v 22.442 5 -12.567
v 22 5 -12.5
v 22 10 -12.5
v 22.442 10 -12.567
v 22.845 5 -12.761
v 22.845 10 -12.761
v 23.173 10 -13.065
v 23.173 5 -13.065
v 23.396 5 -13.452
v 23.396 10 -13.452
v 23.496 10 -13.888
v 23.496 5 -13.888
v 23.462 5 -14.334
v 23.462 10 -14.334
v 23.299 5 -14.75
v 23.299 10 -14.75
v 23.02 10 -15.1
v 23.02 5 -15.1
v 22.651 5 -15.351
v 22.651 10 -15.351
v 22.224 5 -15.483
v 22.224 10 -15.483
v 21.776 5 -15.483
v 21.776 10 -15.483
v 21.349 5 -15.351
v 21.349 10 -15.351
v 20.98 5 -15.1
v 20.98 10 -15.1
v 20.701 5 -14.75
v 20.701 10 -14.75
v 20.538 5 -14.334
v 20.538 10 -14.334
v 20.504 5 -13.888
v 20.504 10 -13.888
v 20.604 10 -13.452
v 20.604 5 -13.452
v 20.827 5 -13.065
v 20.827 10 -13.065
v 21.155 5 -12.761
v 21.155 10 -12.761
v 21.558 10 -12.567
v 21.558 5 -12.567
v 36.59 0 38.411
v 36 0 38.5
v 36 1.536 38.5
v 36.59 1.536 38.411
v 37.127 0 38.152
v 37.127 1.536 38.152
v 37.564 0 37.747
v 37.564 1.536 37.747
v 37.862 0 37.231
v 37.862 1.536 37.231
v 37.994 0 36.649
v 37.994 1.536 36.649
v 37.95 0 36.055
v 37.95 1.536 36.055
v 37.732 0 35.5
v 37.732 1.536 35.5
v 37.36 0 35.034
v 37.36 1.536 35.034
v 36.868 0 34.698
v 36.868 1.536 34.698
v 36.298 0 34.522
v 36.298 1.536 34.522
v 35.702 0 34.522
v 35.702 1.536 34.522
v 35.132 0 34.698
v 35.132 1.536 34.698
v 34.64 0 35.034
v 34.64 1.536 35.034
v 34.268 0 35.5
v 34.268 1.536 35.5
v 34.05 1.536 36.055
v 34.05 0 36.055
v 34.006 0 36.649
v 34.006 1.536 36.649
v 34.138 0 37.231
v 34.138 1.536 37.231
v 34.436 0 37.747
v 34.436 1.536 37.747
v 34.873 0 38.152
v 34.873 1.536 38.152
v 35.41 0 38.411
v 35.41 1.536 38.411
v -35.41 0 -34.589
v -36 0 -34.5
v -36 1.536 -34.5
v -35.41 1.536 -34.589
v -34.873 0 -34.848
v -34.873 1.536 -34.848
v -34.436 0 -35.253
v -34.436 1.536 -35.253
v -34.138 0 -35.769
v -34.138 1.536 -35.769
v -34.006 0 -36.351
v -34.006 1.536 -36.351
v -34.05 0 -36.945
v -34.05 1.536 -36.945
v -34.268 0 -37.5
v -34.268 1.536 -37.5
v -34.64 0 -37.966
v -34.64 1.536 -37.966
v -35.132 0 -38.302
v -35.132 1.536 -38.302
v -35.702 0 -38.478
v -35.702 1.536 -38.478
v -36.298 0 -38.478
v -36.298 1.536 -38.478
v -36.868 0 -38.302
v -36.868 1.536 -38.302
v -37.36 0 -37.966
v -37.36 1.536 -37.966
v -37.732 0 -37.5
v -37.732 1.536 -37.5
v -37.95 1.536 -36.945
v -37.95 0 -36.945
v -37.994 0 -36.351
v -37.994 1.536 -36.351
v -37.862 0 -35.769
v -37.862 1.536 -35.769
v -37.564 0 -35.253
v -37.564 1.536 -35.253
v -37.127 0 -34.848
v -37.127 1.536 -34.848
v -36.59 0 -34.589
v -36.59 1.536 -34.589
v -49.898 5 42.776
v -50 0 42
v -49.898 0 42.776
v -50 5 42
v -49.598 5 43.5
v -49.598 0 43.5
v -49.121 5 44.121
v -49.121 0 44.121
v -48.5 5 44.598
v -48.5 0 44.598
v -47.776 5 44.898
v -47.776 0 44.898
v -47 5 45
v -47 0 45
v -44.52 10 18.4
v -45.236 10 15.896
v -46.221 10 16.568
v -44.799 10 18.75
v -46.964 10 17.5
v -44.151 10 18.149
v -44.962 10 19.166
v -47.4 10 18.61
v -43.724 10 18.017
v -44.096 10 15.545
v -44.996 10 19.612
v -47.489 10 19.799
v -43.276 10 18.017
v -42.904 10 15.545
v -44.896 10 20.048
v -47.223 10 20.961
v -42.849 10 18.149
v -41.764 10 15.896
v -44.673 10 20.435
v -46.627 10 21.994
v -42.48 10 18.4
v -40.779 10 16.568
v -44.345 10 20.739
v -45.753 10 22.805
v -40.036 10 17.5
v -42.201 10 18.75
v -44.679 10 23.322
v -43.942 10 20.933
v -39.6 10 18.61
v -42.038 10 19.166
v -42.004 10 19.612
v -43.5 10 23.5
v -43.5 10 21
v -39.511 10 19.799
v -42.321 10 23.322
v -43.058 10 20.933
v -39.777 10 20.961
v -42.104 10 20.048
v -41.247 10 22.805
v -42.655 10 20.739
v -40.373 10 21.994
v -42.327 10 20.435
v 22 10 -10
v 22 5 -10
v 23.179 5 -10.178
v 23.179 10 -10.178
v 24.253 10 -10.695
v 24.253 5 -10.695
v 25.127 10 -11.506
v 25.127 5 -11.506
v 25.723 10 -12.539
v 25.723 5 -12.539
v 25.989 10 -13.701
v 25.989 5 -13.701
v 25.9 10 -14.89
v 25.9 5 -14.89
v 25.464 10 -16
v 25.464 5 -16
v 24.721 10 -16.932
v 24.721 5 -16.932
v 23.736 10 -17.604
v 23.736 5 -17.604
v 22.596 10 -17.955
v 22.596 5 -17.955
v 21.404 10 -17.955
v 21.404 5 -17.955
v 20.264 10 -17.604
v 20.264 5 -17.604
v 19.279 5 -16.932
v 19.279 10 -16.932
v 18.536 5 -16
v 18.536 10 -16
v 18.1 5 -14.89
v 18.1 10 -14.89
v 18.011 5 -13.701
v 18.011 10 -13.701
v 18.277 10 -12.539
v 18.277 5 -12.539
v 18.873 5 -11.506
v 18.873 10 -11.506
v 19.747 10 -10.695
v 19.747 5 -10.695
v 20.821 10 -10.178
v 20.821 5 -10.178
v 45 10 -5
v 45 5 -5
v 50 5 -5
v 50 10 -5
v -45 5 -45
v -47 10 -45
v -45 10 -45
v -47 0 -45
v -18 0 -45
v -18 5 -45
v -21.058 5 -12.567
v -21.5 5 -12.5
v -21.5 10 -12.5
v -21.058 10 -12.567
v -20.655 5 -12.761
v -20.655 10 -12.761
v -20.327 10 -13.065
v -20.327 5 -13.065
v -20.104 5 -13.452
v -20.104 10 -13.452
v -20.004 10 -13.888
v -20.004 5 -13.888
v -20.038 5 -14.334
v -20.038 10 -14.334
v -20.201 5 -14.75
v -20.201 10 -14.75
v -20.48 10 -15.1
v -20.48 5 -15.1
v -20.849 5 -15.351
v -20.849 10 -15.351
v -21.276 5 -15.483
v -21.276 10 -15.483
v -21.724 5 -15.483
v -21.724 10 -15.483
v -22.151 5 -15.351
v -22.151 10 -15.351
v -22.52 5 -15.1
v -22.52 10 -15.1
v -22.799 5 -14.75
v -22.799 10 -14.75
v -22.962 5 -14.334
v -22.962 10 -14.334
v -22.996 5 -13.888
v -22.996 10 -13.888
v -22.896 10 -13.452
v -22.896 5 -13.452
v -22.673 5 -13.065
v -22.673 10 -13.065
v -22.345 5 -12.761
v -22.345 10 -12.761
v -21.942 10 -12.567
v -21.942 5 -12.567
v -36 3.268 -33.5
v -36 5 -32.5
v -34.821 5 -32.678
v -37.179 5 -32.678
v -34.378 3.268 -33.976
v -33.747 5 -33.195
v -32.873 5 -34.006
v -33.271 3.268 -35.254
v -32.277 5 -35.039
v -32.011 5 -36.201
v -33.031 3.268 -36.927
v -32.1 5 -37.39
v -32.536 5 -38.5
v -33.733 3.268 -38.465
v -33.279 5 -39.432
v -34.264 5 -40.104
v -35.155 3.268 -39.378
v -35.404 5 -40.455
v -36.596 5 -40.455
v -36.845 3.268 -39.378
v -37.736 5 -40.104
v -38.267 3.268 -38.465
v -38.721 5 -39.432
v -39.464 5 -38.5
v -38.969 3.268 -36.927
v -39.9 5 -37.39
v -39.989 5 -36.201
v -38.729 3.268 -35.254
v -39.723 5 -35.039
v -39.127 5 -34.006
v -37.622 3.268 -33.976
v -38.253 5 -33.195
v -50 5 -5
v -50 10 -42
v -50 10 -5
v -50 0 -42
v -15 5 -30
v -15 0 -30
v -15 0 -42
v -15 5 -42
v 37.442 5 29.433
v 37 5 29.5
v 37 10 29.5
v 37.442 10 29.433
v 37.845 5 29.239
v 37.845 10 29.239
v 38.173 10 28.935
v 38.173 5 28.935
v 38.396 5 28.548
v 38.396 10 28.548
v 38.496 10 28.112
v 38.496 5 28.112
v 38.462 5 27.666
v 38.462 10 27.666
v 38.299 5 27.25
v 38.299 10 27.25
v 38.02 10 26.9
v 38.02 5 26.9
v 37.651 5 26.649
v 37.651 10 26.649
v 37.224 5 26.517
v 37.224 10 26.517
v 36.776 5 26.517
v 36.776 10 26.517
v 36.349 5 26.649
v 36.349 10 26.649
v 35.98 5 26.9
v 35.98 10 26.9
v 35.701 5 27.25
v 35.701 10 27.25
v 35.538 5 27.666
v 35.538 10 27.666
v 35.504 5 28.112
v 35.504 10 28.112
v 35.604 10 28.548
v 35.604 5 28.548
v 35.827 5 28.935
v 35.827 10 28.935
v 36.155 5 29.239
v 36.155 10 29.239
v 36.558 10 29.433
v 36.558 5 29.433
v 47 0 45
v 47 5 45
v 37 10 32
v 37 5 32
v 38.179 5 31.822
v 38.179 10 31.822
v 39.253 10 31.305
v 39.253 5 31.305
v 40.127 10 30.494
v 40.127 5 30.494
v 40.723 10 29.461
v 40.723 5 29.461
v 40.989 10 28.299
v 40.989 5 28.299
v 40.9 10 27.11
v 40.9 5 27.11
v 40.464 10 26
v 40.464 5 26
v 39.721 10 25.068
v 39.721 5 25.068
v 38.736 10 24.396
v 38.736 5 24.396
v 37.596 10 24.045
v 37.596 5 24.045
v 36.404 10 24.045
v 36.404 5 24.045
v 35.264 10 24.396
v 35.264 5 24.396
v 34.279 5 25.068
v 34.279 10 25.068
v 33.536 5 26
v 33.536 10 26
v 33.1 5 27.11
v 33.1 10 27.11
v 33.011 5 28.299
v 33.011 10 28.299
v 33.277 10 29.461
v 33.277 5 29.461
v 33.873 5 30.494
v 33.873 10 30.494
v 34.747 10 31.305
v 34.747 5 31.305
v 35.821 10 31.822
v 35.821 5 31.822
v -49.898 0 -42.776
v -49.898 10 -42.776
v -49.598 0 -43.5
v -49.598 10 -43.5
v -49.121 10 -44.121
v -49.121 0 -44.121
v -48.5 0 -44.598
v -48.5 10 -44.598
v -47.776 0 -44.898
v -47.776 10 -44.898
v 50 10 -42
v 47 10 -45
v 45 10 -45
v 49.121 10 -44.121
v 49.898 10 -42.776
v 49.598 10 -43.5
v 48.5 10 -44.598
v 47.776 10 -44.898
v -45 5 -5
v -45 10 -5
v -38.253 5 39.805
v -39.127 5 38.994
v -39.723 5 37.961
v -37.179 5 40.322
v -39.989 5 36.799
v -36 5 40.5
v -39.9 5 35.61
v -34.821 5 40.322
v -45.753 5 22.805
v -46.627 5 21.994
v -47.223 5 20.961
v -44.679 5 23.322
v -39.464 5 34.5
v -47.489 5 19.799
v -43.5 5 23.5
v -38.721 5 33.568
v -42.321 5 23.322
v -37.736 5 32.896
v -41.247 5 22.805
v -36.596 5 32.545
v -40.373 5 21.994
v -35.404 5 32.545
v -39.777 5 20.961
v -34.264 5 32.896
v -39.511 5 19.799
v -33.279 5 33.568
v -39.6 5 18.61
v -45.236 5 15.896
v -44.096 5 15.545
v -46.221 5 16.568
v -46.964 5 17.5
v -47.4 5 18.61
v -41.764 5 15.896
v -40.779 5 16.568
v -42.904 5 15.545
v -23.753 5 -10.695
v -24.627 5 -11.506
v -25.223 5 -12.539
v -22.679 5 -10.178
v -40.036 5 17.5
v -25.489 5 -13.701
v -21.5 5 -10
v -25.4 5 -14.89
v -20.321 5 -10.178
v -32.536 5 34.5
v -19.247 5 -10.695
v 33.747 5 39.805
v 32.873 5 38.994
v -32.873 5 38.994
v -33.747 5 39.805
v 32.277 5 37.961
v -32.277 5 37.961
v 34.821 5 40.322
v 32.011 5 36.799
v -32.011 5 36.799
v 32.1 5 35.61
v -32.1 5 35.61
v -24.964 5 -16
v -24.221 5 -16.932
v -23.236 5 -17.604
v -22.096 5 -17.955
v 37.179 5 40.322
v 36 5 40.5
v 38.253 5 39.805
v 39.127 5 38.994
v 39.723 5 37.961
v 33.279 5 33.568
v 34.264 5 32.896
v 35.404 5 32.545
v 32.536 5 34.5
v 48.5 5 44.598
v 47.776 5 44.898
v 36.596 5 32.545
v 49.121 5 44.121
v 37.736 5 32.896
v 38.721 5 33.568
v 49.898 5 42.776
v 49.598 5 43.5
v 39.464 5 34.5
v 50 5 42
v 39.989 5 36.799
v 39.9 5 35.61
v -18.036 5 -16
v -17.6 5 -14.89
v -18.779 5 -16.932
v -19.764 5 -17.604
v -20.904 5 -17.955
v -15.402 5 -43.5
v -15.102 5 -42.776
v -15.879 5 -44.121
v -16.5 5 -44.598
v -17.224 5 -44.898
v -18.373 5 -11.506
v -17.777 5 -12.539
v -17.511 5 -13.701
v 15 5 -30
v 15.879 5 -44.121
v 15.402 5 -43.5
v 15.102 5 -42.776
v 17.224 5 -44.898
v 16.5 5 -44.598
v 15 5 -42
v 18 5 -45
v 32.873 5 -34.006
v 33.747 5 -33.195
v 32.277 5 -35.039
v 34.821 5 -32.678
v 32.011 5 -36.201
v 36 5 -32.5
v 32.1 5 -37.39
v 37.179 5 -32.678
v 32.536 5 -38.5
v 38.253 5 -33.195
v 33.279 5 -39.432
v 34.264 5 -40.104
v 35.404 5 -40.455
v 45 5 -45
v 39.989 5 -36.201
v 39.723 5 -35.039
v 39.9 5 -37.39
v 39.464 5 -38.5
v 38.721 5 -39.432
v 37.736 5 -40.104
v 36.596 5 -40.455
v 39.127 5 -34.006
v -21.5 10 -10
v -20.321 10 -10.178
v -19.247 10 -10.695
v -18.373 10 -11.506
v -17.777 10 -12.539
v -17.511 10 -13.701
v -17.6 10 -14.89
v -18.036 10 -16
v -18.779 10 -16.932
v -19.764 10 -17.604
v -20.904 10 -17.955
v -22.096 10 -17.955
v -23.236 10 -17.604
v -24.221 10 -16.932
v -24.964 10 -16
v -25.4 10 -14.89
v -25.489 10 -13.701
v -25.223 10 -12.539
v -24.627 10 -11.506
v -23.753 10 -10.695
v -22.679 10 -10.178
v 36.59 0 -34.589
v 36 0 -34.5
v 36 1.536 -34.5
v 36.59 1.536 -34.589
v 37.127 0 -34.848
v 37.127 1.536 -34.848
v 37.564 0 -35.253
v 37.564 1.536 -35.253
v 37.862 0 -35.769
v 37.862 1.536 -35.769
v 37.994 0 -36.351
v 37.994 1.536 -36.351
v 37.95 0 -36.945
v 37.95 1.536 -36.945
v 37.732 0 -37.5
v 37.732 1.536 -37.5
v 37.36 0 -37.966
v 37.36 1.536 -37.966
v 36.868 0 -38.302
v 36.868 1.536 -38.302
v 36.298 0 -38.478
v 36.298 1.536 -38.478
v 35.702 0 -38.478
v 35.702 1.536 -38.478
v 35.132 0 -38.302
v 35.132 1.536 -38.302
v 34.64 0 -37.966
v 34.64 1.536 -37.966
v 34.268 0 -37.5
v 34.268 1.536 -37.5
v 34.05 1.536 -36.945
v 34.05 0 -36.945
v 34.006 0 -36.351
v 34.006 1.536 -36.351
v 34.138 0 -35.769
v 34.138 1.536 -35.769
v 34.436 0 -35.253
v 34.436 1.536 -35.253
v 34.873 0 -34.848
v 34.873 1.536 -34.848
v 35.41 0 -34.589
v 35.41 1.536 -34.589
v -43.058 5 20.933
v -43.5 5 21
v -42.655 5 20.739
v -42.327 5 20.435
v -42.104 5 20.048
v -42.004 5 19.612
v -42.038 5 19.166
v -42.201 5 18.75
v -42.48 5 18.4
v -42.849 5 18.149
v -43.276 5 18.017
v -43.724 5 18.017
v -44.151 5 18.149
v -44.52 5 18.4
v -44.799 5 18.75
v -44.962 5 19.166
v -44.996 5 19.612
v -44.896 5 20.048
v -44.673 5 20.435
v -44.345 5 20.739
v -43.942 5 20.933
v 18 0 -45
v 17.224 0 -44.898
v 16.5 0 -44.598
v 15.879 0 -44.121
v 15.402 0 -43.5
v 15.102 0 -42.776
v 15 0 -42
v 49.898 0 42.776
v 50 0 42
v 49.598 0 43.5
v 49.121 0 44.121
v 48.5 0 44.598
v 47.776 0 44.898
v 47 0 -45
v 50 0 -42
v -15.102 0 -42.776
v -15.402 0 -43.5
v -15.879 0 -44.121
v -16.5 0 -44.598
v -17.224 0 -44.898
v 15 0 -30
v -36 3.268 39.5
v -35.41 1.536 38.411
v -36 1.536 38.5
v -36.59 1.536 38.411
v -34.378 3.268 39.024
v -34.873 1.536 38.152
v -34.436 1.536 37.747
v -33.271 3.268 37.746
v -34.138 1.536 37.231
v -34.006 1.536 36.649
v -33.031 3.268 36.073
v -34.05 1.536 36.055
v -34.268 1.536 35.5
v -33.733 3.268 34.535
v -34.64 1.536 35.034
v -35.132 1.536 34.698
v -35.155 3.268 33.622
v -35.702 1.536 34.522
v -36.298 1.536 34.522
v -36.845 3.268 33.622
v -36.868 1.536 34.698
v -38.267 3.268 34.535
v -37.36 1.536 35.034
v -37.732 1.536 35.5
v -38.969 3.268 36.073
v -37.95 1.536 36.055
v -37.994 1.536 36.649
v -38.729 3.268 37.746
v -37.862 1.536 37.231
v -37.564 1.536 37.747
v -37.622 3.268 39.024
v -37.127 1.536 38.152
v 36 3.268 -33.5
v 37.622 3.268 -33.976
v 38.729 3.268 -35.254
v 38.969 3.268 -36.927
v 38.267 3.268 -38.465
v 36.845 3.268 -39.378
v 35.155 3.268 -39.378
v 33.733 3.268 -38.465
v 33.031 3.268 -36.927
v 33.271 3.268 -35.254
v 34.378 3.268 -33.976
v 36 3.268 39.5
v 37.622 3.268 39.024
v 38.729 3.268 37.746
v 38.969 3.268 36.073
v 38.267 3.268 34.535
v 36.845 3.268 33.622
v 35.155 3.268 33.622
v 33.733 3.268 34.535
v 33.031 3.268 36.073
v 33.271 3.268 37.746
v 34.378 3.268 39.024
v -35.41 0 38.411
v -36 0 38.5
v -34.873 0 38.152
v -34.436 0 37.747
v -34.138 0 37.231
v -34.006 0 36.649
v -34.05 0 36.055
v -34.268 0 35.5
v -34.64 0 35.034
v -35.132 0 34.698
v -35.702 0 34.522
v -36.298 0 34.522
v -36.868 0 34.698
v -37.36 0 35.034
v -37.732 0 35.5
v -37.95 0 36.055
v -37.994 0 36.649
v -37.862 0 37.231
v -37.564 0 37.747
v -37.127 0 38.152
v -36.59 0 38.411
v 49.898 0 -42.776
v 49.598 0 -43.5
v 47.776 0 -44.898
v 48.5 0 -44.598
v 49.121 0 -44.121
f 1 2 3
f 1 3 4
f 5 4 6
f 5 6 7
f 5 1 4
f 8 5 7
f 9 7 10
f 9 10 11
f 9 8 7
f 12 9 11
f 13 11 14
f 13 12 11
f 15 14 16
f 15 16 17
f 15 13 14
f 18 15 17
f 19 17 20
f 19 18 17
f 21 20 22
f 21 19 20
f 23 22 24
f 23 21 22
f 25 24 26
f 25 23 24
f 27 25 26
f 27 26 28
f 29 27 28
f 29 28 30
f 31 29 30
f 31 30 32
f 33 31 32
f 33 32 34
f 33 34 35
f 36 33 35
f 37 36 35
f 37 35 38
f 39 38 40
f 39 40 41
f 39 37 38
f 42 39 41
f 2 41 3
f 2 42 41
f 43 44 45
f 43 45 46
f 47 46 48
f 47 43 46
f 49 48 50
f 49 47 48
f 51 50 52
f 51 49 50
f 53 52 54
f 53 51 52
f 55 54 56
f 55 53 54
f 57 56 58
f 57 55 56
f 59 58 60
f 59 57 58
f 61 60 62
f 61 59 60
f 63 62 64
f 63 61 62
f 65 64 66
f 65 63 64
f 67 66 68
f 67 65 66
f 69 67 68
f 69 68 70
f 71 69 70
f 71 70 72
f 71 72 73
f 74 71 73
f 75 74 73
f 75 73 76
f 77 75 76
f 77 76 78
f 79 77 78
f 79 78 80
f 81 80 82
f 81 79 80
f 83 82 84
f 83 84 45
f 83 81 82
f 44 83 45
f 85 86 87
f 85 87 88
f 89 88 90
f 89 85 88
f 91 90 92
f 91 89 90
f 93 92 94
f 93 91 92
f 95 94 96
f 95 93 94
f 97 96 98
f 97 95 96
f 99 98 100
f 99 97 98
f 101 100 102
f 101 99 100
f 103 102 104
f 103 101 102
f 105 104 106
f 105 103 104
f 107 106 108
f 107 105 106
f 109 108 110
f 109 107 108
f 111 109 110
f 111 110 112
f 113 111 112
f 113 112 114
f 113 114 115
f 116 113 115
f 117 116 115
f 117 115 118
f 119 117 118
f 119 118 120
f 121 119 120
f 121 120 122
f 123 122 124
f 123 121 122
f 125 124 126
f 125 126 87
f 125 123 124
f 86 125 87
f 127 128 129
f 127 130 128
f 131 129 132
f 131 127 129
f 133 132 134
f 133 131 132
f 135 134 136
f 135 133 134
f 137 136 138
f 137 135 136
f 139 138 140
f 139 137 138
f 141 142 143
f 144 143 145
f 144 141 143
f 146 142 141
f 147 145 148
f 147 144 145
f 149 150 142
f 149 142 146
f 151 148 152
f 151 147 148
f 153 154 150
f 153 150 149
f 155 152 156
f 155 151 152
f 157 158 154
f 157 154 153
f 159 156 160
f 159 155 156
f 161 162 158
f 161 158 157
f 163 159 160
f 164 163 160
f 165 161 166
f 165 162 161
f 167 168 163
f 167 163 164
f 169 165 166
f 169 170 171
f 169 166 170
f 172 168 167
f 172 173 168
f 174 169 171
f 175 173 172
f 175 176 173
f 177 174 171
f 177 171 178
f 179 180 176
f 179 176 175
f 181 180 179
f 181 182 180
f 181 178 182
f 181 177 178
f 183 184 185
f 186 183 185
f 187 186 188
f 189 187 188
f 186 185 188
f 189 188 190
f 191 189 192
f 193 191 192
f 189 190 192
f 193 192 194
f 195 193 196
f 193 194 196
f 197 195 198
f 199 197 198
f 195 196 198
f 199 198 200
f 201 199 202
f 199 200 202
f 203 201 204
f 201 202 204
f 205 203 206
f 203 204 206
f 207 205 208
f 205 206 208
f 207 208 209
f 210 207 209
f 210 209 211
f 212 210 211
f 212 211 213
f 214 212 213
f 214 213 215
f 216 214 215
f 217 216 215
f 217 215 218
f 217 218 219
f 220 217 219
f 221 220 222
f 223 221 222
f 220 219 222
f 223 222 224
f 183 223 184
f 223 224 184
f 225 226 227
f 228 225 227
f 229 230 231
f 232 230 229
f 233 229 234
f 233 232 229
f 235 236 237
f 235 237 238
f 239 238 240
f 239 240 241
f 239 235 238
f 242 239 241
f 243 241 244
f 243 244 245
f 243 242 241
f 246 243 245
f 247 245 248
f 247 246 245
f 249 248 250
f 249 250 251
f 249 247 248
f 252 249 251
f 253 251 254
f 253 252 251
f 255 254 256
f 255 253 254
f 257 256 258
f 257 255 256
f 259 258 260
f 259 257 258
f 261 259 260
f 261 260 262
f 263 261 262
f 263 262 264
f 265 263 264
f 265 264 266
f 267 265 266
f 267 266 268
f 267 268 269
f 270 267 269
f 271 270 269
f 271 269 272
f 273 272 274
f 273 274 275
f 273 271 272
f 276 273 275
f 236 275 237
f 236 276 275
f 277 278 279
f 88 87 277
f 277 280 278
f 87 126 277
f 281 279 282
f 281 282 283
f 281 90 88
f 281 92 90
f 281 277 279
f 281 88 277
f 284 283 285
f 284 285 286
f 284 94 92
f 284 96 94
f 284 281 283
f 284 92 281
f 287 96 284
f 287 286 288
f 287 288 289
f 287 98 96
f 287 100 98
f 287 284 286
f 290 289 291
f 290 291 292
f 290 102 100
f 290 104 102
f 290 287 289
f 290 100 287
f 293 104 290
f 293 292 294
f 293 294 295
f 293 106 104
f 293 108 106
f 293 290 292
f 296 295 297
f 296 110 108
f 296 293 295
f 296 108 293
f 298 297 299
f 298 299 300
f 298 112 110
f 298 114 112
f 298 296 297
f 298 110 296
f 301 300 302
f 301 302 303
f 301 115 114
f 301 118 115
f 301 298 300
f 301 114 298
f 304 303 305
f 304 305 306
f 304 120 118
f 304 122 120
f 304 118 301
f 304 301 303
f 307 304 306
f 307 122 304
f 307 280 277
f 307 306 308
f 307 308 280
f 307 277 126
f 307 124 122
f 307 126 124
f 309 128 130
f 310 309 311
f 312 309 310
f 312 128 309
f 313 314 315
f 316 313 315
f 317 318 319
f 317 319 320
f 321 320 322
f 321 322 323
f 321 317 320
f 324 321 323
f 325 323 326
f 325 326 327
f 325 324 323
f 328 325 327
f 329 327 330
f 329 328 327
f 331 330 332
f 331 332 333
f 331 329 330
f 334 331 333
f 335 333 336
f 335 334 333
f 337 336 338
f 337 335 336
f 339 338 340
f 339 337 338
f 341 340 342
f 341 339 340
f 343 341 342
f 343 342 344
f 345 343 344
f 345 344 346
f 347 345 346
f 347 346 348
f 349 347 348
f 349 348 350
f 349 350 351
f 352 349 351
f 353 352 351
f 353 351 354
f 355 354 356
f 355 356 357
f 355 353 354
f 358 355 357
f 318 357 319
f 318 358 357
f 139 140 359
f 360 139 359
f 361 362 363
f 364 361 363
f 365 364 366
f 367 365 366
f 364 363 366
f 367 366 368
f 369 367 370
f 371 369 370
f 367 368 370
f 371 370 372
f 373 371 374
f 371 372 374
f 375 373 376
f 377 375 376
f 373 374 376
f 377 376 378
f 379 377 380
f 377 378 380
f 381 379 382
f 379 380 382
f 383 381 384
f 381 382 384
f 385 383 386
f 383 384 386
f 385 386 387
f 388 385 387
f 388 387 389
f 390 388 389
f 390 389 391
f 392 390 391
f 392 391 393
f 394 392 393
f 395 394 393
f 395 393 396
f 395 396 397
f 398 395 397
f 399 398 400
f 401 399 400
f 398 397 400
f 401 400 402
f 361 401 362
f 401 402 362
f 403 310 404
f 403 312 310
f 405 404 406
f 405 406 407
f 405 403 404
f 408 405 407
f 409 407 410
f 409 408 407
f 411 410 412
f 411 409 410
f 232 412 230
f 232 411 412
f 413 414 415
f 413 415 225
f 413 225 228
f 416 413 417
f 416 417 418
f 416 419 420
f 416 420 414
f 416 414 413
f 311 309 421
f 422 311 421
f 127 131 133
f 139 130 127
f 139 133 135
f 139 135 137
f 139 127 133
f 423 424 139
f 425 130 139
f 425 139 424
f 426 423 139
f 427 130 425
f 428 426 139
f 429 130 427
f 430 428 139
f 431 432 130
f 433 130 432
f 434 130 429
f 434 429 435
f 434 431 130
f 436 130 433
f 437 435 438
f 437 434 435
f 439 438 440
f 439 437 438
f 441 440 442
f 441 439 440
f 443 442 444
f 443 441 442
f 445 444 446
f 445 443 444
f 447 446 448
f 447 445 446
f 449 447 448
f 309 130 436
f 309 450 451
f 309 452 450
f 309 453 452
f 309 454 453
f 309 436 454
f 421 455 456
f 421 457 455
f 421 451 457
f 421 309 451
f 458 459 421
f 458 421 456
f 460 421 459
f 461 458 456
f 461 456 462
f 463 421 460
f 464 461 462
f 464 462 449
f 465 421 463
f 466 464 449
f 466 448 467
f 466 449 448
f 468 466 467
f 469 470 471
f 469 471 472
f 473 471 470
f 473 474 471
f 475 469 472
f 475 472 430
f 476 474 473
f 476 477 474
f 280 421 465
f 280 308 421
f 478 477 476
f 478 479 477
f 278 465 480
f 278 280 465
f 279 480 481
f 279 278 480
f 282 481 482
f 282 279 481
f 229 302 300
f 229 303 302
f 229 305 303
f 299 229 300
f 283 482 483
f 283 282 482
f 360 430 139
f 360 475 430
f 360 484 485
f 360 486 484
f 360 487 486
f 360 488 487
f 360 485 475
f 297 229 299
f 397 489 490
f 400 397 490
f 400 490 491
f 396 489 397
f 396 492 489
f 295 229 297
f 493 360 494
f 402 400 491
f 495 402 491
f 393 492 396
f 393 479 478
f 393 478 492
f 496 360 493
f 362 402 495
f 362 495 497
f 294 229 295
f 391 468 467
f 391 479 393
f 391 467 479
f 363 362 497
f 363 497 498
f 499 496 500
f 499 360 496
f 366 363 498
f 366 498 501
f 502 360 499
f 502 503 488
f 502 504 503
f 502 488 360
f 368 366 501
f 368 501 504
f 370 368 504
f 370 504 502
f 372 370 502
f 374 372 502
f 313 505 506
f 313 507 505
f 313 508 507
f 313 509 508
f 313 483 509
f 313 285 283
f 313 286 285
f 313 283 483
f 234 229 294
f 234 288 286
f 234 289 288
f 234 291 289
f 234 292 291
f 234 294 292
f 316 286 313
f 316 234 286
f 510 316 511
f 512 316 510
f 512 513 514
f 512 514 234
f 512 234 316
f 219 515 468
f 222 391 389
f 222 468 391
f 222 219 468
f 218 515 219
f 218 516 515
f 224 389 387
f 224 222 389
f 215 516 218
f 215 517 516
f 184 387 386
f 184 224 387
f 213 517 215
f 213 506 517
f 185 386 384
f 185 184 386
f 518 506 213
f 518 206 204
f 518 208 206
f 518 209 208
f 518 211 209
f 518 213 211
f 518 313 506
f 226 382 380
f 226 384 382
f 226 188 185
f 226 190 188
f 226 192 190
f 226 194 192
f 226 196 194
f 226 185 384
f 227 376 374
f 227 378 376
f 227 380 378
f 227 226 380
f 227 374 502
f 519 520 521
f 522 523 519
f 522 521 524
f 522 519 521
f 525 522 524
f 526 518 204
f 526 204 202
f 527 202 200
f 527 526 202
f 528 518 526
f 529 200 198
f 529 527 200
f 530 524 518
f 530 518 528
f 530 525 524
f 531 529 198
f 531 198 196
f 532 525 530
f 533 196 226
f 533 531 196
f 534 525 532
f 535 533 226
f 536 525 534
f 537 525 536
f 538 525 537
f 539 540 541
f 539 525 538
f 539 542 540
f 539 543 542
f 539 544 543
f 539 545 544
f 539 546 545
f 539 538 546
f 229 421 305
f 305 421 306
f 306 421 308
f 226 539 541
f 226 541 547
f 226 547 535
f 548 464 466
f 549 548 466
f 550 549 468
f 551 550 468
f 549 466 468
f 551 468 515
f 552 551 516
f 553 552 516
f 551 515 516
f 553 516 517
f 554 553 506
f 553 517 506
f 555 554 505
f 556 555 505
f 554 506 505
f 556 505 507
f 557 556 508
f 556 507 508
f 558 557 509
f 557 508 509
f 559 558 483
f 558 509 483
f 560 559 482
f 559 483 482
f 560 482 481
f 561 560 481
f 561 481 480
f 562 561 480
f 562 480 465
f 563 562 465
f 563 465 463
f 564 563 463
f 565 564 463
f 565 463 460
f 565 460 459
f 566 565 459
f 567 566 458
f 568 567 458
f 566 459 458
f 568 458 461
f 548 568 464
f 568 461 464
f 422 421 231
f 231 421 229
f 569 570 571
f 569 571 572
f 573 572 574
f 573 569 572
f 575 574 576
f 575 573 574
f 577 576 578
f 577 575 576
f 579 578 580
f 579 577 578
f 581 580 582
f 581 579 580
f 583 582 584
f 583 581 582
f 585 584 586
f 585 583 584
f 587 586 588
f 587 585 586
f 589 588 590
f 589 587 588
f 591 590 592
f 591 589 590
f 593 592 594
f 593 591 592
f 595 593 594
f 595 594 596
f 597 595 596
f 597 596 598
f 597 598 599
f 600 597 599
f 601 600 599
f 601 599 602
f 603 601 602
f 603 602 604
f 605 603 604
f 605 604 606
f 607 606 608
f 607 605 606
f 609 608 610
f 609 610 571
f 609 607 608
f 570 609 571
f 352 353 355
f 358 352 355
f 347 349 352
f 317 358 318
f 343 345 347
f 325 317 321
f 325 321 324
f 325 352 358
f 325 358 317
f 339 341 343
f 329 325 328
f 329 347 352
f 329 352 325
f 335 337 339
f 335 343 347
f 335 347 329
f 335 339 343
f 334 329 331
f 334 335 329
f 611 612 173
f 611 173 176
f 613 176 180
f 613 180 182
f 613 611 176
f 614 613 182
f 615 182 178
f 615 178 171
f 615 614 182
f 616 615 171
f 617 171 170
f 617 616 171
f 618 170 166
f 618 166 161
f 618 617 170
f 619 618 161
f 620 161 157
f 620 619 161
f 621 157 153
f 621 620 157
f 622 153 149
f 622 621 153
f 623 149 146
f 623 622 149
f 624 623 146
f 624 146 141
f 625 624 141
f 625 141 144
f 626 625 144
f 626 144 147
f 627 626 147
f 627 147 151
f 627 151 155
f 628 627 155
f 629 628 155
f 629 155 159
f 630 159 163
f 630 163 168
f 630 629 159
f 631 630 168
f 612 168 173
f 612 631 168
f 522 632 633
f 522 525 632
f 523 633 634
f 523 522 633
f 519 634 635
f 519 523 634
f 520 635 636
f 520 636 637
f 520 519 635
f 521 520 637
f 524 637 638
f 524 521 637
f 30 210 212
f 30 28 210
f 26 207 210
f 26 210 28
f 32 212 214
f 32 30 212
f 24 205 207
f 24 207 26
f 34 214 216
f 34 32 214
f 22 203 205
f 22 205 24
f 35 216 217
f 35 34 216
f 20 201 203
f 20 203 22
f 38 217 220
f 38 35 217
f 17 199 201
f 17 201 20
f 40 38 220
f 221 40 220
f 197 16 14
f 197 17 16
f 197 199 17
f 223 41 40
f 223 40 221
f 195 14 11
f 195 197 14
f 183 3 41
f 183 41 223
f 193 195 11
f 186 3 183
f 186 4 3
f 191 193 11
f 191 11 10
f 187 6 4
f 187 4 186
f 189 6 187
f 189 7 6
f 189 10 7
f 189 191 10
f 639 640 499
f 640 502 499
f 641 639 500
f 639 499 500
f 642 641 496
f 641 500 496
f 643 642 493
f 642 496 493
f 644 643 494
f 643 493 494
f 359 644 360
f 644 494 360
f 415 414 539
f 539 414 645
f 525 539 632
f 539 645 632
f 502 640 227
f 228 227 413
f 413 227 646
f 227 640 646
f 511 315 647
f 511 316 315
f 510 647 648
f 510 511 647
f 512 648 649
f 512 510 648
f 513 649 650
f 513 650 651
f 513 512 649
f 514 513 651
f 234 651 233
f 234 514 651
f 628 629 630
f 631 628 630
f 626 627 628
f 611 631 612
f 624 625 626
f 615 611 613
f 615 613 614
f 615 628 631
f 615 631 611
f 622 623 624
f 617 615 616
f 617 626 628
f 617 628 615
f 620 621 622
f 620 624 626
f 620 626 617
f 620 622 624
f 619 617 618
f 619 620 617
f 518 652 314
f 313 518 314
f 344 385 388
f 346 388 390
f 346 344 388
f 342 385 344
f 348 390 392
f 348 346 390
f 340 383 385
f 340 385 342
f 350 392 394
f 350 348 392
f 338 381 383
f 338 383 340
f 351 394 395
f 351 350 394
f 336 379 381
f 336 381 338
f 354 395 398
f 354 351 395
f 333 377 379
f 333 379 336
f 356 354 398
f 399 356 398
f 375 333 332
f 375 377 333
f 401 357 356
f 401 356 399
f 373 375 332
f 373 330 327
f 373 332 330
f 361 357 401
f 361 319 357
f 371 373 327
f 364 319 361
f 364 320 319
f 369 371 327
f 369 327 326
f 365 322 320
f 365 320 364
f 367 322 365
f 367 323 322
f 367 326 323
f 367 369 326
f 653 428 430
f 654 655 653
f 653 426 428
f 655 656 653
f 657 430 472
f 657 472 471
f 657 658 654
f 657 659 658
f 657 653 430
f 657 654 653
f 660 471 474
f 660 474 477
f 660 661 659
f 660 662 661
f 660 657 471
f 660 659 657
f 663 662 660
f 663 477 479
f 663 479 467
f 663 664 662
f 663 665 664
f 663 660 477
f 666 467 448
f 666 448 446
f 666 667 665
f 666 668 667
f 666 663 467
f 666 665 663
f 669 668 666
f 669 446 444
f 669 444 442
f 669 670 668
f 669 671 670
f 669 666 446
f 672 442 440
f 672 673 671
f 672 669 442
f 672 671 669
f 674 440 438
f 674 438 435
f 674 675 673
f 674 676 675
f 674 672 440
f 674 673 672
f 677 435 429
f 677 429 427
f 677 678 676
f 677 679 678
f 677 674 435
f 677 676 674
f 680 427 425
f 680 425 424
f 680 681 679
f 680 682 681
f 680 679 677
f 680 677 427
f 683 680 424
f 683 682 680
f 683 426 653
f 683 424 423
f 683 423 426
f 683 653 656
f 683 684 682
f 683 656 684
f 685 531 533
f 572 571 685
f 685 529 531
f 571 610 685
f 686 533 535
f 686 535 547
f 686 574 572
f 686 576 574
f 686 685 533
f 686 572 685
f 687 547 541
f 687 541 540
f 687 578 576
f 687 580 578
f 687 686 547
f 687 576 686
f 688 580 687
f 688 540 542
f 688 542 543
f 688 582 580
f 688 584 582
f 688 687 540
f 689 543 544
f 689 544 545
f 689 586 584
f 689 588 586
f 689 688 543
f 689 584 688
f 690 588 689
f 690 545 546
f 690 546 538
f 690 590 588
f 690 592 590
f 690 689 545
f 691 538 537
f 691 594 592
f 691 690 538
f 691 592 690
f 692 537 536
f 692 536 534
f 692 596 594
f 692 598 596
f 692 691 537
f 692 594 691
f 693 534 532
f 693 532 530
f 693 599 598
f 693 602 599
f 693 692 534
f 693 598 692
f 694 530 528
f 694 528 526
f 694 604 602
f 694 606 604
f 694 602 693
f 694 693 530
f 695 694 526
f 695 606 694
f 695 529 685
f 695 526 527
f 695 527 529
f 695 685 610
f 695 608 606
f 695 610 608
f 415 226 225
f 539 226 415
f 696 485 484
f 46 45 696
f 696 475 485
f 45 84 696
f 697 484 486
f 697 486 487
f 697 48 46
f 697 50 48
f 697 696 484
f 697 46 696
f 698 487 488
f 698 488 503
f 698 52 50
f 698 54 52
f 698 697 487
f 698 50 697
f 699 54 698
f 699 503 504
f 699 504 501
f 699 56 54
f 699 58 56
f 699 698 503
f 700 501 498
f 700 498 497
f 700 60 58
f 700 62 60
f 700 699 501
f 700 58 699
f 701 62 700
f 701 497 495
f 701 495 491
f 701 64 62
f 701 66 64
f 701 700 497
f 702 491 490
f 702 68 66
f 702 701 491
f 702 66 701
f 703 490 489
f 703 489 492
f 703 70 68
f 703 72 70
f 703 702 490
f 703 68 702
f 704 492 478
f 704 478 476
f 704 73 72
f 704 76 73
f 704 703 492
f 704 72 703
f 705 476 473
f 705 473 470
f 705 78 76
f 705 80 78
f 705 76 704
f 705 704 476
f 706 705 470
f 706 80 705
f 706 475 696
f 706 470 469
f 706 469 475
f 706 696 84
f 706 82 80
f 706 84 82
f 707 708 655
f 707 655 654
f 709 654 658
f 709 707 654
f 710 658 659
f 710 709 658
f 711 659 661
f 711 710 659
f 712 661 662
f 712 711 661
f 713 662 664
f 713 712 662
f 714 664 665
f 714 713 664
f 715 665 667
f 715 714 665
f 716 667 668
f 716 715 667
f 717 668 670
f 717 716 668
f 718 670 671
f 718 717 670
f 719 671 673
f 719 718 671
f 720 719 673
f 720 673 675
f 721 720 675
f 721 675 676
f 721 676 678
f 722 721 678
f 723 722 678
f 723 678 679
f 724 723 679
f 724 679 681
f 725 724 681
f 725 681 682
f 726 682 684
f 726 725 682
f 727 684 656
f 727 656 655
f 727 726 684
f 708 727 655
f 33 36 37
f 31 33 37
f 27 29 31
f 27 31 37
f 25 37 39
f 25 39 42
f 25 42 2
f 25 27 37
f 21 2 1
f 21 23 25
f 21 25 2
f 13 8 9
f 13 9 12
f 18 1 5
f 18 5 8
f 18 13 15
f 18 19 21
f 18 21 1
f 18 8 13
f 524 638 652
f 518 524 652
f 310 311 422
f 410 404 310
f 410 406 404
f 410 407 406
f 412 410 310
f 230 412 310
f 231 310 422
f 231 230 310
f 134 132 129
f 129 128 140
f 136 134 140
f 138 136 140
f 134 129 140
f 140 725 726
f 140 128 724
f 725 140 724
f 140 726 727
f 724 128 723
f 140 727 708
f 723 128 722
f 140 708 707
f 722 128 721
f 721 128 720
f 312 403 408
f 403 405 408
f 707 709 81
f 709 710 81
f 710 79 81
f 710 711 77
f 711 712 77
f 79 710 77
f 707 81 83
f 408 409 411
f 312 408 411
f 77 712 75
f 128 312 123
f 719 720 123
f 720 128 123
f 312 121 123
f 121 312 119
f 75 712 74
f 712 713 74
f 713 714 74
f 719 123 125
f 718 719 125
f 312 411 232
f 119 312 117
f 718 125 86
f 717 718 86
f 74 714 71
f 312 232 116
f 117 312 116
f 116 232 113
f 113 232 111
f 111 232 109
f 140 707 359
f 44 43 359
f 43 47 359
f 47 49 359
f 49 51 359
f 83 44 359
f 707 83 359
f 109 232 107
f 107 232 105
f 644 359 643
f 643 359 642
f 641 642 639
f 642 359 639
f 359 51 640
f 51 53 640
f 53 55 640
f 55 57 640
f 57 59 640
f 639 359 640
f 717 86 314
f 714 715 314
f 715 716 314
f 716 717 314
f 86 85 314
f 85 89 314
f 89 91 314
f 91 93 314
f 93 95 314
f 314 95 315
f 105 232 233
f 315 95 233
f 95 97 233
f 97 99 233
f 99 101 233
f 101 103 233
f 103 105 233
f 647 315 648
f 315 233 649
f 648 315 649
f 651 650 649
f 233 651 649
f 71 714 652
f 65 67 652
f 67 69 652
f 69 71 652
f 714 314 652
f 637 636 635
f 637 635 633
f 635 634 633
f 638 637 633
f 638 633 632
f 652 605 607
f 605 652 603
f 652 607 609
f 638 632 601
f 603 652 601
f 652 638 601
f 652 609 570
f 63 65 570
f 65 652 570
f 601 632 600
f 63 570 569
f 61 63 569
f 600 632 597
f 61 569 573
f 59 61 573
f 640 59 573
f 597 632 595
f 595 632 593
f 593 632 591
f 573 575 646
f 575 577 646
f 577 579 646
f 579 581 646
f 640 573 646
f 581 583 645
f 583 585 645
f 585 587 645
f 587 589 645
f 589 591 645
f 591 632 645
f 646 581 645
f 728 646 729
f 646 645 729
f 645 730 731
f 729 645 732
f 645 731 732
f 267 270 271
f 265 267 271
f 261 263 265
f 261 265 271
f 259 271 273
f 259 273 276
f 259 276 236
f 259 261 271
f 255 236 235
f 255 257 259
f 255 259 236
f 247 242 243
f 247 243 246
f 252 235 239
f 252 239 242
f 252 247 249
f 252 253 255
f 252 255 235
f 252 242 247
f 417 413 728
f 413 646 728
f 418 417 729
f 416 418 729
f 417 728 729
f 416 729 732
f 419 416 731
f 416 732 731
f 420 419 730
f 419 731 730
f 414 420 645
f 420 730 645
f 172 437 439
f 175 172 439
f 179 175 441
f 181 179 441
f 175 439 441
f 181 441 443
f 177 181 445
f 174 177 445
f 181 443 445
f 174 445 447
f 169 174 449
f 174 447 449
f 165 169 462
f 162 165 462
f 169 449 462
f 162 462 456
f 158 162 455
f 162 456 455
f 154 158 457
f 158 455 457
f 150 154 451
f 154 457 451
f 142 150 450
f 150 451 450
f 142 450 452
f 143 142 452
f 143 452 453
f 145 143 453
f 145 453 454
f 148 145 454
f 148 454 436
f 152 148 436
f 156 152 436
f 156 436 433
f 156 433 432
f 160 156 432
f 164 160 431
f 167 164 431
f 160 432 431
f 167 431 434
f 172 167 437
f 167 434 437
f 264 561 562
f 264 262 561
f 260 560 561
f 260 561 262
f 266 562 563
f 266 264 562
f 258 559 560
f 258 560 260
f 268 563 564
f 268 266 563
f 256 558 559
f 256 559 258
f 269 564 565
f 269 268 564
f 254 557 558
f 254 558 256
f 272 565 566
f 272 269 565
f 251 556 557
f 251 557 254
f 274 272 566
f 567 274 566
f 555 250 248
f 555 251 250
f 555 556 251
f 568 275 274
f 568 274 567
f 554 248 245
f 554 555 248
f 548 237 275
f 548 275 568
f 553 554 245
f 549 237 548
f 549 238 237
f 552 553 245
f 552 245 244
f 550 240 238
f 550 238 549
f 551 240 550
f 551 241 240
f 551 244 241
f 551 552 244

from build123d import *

# Parameters (mm, degrees)
CROQUIS1_R              = 2
SALIENTE_EXTRUIR2_DEPTH = 5
CHAFL_N1_SIZE           = 2
CHAFL_N1_SIZE2          = 3.464101615
CROQUIS3_R              = 4
CROQUIS3_R_2            = 1.5
SALIENTE_EXTRUIR3_DEPTH = 5
CROQUIS4_W              = 5
CROQUIS4_H              = 40
SALIENTE_EXTRUIR4_DEPTH = 5
REDONDEO1_R             = 3


with BuildPart() as part:
    # Croquis1 → Saliente-Extruir2 (new body)
    with BuildSketch(Plane(origin=(0, 0, 0), x_dir=(1, 0, 0), z_dir=(0, 1, 0))):
        Polygon((-50, 45), (-50, -45), (50, -45), (50, 45), (15, 45), (15, 30), (-15, 30), (-15, 45), align=None)
        with Locations(Location((-36, -36.5, 0), (0, 0, 270))):
            Circle(CROQUIS1_R, mode=Mode.SUBTRACT)
        with Locations(Location((-36, 36.5, 0), (0, 0, 270))):
            Circle(CROQUIS1_R, mode=Mode.SUBTRACT)
        with Locations(Location((36, 36.5, 0), (0, 0, 270))):
            Circle(CROQUIS1_R, mode=Mode.SUBTRACT)
        with Locations(Location((36, -36.5, 0), (0, 0, 270))):
            Circle(CROQUIS1_R, mode=Mode.SUBTRACT)
    extrude(amount=SALIENTE_EXTRUIR2_DEPTH)

    # Chaflán1
    chafl_n1_edges = [part.edges().sort_by_distance(p)[0] for p in [
        (-36, 5, 34.5),
        (-36, 5, -38.5),
        (36, 5, -38.5),
        (36, 5, 34.5),
    ]]
    chafl_n1_side = [part.faces().sort_by_distance(p)[0] for p in [
        (0, 5, 1.985356127),
    ]]
    chamfer(chafl_n1_edges, length=CHAFL_N1_SIZE, length2=CHAFL_N1_SIZE2, reference=chafl_n1_side[0])

    # Croquis3 → Saliente-Extruir3 (add)
    # profile 1 of 4: a face of its own
    with BuildSketch(Plane(origin=(0, 5, 0), x_dir=(1, 0, 0), z_dir=(0, 1, 0))):
        with Locations(Location((-43.5, -19.5, 0), (0, 0, 270))):
            Circle(CROQUIS3_R)
        with Locations(Location((-43.5, -19.5, 0), (0, 0, 270))):
            Circle(CROQUIS3_R_2, mode=Mode.SUBTRACT)
    # profile 2 of 4: a face of its own
    with BuildSketch(Plane(origin=(0, 5, 0), x_dir=(1, 0, 0), z_dir=(0, 1, 0))):
        with Locations(Location((37, -28, 0), (0, 0, 270))):
            Circle(CROQUIS3_R)
        with Locations(Location((37, -28, 0), (0, 0, 270))):
            Circle(CROQUIS3_R_2, mode=Mode.SUBTRACT)
    # profile 3 of 4: a face of its own
    with BuildSketch(Plane(origin=(0, 5, 0), x_dir=(1, 0, 0), z_dir=(0, 1, 0))):
        with Locations(Location((22, 14, 0), (0, 0, 270))):
            Circle(CROQUIS3_R)
        with Locations(Location((22, 14, 0), (0, 0, 270))):
            Circle(CROQUIS3_R_2, mode=Mode.SUBTRACT)
    # profile 4 of 4: a face of its own
    with BuildSketch(Plane(origin=(0, 5, 0), x_dir=(1, 0, 0), z_dir=(0, 1, 0))):
        with Locations(Location((-21.5, 14, 0), (0, 0, 270))):
            Circle(CROQUIS3_R)
        with Locations(Location((-21.5, 14, 0), (0, 0, 270))):
            Circle(CROQUIS3_R_2, mode=Mode.SUBTRACT)
    extrude(amount=SALIENTE_EXTRUIR3_DEPTH)

    # Croquis4 → Saliente-Extruir4 (add)
    with BuildSketch(Plane(origin=(0, 5, 0), x_dir=(1, 0, 0), z_dir=(0, 1, 0))):
        with Locations((-47.5, 25)):
            Rectangle(CROQUIS4_W, CROQUIS4_H)
        with Locations((47.5, 25)):
            Rectangle(CROQUIS4_W, CROQUIS4_H)
    extrude(amount=SALIENTE_EXTRUIR4_DEPTH)

    # Redondeo1
    redondeo1_edges = [part.edges().sort_by_distance(p)[0] for p in [
        (50, 2.5, 45),
        (-50, 2.5, 45),
        (-50, 5, -45),
        (-15, 2.5, -45),
        (15, 2.5, -45),
        (50, 5, -45),
    ]]
    fillet(redondeo1_edges, radius=REDONDEO1_R)


solid = part.part
